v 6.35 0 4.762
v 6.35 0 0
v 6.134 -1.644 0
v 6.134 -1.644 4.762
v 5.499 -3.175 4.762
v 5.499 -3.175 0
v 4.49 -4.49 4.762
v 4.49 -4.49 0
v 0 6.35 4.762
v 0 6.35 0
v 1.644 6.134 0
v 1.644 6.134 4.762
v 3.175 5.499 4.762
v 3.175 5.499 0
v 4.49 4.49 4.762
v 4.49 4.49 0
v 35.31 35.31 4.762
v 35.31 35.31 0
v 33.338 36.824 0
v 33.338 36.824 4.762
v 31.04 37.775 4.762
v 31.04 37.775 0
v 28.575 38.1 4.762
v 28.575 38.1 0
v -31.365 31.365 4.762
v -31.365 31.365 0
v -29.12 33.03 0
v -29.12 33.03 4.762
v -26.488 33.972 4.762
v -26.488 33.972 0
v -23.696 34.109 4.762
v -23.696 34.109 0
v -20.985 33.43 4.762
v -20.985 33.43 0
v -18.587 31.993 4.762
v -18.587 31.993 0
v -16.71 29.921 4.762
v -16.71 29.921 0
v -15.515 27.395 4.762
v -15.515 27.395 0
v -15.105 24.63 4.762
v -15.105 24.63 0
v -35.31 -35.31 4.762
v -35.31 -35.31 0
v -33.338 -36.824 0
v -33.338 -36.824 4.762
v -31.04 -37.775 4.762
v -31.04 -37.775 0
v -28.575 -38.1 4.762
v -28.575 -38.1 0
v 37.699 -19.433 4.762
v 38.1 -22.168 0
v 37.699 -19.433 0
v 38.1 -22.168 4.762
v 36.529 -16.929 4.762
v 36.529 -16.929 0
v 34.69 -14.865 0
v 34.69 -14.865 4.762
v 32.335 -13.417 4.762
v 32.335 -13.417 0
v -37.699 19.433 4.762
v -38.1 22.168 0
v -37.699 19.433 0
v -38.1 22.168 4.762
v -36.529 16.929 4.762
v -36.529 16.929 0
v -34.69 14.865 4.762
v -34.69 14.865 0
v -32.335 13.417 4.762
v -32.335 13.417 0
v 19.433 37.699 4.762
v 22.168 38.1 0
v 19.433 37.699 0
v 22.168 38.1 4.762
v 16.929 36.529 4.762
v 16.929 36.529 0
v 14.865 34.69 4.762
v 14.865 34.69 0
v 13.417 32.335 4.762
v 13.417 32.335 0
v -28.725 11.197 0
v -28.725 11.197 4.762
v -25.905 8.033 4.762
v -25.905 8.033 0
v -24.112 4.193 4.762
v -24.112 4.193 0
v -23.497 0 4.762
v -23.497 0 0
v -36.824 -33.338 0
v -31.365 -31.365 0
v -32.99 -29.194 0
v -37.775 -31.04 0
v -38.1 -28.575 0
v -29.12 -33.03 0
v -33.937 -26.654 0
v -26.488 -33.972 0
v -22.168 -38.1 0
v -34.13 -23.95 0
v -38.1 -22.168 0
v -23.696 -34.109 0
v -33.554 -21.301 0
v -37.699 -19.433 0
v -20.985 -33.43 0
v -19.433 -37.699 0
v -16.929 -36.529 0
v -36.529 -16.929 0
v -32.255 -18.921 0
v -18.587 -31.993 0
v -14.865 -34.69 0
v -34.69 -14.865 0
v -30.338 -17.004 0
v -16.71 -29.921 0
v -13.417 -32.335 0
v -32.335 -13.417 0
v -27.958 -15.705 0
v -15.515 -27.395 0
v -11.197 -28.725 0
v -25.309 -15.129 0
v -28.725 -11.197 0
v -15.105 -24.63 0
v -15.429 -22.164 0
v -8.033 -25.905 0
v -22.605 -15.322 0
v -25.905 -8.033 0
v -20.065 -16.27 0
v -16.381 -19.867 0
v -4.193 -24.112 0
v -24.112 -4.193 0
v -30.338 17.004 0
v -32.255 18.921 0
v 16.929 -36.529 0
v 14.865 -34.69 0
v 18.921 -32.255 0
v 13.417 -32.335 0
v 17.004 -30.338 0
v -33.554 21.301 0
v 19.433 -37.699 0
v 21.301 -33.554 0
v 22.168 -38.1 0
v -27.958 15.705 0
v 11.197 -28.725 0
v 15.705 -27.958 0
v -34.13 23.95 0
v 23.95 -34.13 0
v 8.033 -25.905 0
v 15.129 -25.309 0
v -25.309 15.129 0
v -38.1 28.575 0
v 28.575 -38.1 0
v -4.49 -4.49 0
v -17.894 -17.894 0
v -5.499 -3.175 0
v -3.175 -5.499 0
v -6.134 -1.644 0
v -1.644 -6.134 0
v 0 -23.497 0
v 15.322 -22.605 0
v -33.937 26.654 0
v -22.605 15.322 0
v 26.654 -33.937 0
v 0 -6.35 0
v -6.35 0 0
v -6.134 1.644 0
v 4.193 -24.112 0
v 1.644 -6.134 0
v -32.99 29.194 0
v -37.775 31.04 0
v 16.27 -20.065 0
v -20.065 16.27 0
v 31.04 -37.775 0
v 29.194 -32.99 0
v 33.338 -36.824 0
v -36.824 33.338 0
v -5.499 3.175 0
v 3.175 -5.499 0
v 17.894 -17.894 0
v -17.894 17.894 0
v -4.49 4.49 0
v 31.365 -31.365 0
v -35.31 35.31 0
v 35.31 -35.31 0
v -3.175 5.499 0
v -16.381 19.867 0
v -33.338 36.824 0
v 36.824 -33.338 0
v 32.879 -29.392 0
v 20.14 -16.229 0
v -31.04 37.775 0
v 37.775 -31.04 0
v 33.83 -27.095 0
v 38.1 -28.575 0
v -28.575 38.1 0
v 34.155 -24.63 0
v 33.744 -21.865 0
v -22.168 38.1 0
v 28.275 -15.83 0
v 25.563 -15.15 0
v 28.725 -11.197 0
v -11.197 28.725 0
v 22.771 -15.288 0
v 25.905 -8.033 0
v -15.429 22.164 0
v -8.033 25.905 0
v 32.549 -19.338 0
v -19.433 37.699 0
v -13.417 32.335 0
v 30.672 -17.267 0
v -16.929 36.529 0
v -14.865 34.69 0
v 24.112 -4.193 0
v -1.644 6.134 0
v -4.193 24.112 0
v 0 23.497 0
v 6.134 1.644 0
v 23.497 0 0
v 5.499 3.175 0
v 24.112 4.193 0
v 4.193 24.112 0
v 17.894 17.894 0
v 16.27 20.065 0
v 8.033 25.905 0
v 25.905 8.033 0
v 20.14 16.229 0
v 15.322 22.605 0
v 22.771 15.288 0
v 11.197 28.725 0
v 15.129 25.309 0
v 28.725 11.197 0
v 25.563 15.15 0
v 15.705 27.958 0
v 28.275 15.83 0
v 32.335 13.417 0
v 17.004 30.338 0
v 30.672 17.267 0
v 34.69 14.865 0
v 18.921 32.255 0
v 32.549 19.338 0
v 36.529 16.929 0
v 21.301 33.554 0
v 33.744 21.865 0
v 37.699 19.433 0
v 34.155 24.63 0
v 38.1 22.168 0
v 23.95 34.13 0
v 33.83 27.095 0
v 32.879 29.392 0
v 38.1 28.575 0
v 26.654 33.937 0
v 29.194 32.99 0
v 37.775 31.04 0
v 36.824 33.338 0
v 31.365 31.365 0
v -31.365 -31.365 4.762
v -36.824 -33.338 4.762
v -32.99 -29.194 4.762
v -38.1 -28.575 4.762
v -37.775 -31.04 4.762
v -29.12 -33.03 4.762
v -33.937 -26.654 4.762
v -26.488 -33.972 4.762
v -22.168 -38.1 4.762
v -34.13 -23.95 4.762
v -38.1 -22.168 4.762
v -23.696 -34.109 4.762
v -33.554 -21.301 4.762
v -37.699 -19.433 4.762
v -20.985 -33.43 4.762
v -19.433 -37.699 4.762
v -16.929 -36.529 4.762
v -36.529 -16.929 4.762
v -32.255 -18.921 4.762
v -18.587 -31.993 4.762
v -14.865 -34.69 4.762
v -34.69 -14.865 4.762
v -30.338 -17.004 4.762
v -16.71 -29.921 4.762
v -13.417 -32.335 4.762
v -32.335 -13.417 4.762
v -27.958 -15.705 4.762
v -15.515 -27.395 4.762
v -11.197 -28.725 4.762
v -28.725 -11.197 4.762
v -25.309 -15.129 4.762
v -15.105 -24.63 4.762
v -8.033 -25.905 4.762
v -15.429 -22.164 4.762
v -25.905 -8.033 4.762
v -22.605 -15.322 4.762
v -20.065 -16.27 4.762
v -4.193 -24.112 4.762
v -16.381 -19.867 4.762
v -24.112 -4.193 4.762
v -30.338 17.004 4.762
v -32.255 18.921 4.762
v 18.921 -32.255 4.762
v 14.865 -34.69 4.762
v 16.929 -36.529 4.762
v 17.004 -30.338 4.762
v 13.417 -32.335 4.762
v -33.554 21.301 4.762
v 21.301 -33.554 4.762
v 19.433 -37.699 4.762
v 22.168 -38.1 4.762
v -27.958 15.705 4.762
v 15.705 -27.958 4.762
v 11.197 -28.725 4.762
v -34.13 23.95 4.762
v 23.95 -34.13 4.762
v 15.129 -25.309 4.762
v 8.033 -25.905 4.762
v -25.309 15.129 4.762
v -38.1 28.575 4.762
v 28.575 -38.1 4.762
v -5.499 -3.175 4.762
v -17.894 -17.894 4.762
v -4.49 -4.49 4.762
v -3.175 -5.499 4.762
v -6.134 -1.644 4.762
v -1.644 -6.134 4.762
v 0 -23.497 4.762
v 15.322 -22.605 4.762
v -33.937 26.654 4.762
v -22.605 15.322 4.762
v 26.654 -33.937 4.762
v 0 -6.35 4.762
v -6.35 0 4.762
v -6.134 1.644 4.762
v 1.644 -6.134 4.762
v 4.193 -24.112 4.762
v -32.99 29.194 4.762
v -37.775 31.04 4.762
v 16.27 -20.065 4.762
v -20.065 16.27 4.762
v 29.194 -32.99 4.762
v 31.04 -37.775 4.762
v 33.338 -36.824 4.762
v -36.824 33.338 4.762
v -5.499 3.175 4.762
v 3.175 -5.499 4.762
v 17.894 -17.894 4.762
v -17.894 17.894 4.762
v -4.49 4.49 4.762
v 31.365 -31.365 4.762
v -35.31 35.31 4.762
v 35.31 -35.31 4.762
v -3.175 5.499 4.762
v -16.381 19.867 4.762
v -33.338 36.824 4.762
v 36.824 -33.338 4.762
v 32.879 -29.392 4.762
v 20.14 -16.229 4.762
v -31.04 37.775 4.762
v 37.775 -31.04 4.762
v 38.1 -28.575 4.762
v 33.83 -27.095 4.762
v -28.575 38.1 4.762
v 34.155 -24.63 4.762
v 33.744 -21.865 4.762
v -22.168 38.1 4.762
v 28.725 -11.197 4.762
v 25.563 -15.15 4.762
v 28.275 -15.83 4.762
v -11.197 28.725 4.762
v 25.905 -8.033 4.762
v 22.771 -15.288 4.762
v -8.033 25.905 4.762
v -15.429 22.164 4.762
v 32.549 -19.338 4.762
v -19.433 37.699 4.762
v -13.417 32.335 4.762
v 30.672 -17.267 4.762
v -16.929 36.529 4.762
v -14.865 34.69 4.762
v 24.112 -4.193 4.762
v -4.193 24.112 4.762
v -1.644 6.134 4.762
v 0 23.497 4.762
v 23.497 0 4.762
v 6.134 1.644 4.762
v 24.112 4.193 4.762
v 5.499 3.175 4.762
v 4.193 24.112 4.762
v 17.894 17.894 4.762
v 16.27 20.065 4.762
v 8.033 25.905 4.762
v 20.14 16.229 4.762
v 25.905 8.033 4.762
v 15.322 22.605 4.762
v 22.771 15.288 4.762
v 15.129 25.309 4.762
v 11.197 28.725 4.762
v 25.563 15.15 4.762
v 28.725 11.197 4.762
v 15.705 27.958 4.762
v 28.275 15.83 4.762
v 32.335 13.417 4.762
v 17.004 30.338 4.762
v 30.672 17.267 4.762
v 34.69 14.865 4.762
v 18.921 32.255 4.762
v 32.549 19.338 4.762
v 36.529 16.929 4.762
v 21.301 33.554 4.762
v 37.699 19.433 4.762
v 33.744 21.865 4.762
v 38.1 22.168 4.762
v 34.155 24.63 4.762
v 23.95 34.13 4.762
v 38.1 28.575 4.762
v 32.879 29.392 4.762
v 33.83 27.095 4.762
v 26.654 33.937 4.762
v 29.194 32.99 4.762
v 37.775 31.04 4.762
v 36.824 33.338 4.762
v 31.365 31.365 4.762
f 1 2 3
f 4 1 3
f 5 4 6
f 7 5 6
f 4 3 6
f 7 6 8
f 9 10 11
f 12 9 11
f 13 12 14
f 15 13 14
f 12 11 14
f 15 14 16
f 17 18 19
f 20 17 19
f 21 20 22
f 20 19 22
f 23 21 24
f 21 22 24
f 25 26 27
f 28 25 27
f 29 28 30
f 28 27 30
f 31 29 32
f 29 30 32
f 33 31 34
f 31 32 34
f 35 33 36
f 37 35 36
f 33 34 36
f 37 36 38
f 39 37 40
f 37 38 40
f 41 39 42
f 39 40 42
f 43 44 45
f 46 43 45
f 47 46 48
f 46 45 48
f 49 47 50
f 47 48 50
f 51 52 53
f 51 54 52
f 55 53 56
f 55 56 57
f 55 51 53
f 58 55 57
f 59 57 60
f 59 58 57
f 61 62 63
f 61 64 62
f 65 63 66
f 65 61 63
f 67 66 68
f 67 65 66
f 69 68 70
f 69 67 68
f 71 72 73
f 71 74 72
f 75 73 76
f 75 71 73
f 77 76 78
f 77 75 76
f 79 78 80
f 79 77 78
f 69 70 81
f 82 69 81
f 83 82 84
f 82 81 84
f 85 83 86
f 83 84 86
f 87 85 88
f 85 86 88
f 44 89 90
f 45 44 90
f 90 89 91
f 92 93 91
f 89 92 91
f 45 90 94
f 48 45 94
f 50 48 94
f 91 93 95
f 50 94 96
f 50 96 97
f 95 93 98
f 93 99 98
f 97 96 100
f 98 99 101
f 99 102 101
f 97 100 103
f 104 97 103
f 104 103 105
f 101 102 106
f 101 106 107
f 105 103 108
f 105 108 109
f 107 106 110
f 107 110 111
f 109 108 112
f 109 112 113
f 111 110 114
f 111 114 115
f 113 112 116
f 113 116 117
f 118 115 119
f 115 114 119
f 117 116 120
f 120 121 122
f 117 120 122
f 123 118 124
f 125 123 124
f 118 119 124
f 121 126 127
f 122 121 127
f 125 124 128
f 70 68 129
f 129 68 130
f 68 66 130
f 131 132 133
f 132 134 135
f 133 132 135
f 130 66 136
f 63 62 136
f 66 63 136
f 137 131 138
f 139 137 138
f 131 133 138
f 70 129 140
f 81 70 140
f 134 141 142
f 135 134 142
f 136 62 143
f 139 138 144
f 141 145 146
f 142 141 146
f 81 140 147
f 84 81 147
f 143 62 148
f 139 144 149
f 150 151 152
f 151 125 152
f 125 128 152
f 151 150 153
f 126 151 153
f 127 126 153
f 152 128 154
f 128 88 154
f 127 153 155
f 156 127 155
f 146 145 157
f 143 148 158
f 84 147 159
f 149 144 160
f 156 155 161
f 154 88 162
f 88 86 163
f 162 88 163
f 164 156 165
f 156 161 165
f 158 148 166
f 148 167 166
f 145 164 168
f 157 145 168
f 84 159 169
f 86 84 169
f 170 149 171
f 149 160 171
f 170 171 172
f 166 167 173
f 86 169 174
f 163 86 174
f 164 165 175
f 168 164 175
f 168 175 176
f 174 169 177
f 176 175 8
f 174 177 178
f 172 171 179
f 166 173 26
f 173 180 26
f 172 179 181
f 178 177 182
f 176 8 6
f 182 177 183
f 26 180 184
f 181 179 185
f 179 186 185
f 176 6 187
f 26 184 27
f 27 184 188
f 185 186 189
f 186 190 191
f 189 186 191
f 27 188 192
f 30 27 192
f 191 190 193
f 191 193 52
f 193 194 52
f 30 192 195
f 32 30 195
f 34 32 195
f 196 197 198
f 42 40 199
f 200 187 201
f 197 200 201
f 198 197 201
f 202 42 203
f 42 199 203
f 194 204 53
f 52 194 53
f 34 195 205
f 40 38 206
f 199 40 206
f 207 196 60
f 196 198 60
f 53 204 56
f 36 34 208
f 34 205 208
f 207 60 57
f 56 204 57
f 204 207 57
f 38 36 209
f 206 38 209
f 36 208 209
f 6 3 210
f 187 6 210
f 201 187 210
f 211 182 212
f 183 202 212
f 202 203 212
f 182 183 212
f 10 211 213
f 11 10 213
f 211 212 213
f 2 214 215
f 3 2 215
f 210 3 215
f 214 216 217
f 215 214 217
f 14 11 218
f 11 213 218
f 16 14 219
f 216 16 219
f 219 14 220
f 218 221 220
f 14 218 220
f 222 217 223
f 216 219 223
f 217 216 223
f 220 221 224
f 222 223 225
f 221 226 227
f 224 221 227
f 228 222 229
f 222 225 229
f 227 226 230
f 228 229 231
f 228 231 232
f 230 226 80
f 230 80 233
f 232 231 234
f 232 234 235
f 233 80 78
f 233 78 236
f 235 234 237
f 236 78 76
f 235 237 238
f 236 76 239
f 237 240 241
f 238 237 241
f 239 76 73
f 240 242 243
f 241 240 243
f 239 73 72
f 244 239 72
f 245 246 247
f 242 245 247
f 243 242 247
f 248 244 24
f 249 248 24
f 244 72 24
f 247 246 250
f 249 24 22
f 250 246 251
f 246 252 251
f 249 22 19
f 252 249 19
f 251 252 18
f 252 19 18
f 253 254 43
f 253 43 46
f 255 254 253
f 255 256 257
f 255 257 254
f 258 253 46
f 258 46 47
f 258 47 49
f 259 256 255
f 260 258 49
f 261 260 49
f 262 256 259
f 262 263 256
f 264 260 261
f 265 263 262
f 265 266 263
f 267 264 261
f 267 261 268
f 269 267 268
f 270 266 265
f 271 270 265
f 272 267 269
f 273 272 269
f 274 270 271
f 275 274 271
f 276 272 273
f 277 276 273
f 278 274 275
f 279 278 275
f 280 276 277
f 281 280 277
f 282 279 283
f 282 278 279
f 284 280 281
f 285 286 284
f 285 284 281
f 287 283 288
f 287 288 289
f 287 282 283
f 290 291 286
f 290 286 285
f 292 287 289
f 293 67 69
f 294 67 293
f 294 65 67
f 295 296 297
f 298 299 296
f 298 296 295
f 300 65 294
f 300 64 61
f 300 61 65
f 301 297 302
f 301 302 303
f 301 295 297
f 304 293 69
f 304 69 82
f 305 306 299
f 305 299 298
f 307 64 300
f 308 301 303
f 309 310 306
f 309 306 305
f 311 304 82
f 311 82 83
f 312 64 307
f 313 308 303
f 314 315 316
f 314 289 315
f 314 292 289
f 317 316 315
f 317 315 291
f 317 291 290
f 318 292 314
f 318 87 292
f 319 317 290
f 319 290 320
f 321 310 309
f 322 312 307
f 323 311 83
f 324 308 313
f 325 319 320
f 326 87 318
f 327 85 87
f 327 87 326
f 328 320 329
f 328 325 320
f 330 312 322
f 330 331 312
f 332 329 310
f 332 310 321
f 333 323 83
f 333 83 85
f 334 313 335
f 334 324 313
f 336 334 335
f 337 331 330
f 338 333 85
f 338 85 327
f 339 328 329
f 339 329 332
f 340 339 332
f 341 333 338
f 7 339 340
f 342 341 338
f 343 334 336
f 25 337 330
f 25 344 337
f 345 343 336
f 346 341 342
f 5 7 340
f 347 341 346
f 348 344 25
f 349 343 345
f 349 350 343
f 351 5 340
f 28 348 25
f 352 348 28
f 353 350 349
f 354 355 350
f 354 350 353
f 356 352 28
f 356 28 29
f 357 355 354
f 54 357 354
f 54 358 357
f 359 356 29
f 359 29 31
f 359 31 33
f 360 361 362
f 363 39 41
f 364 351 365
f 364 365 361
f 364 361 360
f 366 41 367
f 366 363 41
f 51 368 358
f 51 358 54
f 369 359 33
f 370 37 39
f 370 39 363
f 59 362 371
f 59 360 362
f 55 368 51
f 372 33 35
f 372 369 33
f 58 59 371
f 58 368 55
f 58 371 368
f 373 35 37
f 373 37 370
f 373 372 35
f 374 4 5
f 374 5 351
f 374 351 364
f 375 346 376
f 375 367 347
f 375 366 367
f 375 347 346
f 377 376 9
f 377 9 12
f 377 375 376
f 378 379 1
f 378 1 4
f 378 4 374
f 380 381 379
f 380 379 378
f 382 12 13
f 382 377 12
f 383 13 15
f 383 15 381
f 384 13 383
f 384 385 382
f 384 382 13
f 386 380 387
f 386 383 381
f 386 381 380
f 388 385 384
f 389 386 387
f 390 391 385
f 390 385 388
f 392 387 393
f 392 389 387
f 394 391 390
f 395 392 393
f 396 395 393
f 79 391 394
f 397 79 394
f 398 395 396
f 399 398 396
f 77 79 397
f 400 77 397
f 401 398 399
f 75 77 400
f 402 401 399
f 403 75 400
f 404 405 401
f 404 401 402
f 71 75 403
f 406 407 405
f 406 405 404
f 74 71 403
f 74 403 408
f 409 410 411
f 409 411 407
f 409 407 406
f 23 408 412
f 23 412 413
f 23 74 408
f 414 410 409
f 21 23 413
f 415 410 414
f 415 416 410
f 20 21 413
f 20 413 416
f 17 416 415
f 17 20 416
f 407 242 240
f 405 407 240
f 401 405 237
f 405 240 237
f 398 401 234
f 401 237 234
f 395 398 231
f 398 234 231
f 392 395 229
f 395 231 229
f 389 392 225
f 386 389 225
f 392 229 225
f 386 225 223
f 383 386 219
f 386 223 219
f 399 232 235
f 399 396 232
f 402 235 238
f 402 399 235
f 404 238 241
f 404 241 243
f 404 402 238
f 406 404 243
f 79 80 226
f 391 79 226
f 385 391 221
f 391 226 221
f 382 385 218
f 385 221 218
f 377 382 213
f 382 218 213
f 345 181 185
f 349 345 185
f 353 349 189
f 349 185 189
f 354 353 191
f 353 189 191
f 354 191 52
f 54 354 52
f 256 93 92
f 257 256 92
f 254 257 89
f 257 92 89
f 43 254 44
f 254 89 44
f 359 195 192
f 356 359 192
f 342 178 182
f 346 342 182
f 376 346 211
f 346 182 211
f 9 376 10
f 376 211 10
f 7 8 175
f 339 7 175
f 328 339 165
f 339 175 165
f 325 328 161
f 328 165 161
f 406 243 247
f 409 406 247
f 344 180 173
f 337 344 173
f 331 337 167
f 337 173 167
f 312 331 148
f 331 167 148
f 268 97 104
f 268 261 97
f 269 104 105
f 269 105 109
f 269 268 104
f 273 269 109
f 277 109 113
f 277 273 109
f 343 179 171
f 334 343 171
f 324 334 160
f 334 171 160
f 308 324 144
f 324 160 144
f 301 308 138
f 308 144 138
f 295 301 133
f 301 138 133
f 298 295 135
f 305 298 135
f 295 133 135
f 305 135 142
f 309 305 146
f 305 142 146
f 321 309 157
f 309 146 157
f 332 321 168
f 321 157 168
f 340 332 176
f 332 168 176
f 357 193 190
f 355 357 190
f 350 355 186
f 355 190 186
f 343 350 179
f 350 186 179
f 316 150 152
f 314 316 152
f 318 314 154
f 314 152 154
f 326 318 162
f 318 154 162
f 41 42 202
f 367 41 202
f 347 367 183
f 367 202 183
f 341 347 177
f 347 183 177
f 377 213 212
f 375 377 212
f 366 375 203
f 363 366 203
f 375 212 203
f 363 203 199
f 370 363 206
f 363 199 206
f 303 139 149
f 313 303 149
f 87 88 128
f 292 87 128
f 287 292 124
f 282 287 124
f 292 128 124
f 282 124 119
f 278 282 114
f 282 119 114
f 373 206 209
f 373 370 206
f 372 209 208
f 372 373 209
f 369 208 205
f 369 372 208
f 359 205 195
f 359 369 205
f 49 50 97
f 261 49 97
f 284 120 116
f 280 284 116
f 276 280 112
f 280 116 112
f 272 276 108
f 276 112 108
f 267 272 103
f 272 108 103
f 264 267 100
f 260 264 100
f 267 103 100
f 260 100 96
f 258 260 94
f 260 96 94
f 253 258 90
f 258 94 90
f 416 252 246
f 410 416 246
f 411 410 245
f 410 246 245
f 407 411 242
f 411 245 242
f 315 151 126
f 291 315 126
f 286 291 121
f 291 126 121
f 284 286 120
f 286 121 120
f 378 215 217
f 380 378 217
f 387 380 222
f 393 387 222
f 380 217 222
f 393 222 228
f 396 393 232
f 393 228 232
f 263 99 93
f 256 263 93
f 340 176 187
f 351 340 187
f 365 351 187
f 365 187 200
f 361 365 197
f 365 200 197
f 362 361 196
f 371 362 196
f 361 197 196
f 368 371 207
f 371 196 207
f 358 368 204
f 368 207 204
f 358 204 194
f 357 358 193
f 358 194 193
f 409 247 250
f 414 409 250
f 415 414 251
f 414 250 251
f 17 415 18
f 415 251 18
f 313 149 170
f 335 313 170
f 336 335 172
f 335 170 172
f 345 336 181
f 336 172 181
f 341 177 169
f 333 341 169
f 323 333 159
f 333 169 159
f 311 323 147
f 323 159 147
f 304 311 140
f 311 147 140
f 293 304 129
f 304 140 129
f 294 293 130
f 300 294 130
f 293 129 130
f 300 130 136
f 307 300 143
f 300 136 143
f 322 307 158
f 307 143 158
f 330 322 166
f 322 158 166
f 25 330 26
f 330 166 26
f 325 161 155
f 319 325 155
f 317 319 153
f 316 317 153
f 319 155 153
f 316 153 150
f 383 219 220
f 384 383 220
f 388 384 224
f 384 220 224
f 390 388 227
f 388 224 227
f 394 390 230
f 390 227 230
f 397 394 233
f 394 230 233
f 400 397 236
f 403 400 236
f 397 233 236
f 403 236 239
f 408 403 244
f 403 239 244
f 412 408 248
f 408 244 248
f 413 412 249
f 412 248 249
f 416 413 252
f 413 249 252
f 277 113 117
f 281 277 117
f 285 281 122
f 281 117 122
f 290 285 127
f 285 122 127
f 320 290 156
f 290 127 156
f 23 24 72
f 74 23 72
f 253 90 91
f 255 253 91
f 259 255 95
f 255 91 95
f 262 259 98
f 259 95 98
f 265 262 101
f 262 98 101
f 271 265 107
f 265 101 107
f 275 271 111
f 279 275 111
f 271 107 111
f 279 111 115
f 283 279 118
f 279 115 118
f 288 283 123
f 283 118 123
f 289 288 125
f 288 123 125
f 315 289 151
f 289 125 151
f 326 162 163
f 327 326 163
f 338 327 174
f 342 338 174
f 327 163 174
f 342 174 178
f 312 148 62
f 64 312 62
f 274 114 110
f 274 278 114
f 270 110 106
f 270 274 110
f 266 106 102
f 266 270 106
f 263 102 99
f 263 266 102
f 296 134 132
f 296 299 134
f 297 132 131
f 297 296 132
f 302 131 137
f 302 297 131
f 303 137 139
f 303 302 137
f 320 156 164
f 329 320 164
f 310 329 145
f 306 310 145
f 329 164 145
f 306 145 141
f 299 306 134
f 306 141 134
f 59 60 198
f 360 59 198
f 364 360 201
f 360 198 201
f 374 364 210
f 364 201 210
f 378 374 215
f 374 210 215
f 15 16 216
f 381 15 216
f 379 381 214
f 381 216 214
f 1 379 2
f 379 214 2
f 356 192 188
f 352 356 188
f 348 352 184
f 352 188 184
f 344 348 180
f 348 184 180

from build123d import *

# Parameters (mm, degrees)
F1_DEPTH = 4.7625
F2_R     = 9.525


with BuildPart() as f1:
    # F0 (on Top) → F1 (new body)
    with BuildSketch(Plane.XY):
        with BuildLine():
            Line((-17.8944237276, -17.8944237276), (-4.4901280605, -4.4901280605))
            ThreePointArc((-4.4901280605, -4.4901280605), (-5.8666350314, -2.4300397955), (-6.35, 0))
            Line((-6.35, 0), (-23.4970493061, 0))
            ThreePointArc((-23.4970493061, 0), (-27.774154539, -10.325845461), (-38.1, -14.6029506939))
            Line((-38.1, -14.6029506939), (-38.1, -28.575))
            ThreePointArc((-38.1, -28.575), (-37.3749525472, -32.2200596933), (-35.3101920908, -35.3101920908))
            Line((-35.3101920908, -35.3101920908), (-31.3648079092, -31.3648079092))
            ThreePointArc((-31.3648079092, -31.3648079092), (-31.3648079092, -17.8944237276), (-17.8944237276, -17.8944237276))
        make_face()
        with BuildLine():
            ThreePointArc((-6.35, 0), (-5.8666350314, 2.4300397955), (-4.4901280605, 4.4901280605))
            Line((-4.4901280605, 4.4901280605), (-17.8944237276, 17.8944237276))
            ThreePointArc((-17.8944237276, 17.8944237276), (-31.3648079092, 17.8944237276), (-31.3648079092, 31.3648079092))
            Line((-31.3648079092, 31.3648079092), (-35.3101920908, 35.3101920908))
            ThreePointArc((-35.3101920908, 35.3101920908), (-37.3749525472, 32.2200596933), (-38.1, 28.575))
            Line((-38.1, 28.575), (-38.1, 14.6029506939))
            ThreePointArc((-38.1, 14.6029506939), (-27.774154539, 10.325845461), (-23.4970493061, 0))
            Line((-23.4970493061, 0), (-6.35, 0))
        make_face()
        with BuildLine():
            ThreePointArc((-4.4901280605, 4.4901280605), (-2.4300397955, 5.8666350314), (0, 6.35))
            Line((0, 6.35), (0, 23.4970493061))
            ThreePointArc((0, 23.4970493061), (-10.325845461, 27.774154539), (-14.6029506939, 38.1))
            Line((-14.6029506939, 38.1), (-28.575, 38.1))
            ThreePointArc((-28.575, 38.1), (-32.2200596933, 37.3749525472), (-35.3101920908, 35.3101920908))
            Line((-35.3101920908, 35.3101920908), (-31.3648079092, 31.3648079092))
            ThreePointArc((-31.3648079092, 31.3648079092), (-20.9845561251, 33.4295683656), (-15.1046158184, 24.6296158184))
            ThreePointArc((-15.1046158184, 24.6296158184), (-15.8296632712, 20.9845561251), (-17.8944237276, 17.8944237276))
            Line((-17.8944237276, 17.8944237276), (-4.4901280605, 4.4901280605))
        make_face()
        with BuildLine():
            ThreePointArc((0, 6.35), (2.4300397955, 5.8666350314), (4.4901280605, 4.4901280605))
            Line((4.4901280605, 4.4901280605), (17.8944237276, 17.8944237276))
            ThreePointArc((17.8944237276, 17.8944237276), (17.8944237276, 31.3648079092), (31.3648079092, 31.3648079092))
            Line((31.3648079092, 31.3648079092), (35.3101920908, 35.3101920908))
            ThreePointArc((35.3101920908, 35.3101920908), (32.2200596933, 37.3749525472), (28.575, 38.1))
            Line((28.575, 38.1), (14.6029506939, 38.1))
            ThreePointArc((14.6029506939, 38.1), (10.325845461, 27.774154539), (0, 23.4970493061))
            Line((0, 23.4970493061), (0, 6.35))
        make_face()
        with BuildLine():
            ThreePointArc((4.4901280605, 4.4901280605), (5.8666350314, 2.4300397955), (6.35, 0))
            Line((6.35, 0), (23.4970493061, 0))
            ThreePointArc((23.4970493061, 0), (27.774154539, 10.325845461), (38.1, 14.6029506939))
            Line((38.1, 14.6029506939), (38.1, 28.575))
            ThreePointArc((38.1, 28.575), (37.3749525472, 32.2200596933), (35.3101920908, 35.3101920908))
            Line((35.3101920908, 35.3101920908), (31.3648079092, 31.3648079092))
            ThreePointArc((31.3648079092, 31.3648079092), (33.4295683656, 28.2746755117), (34.1546158184, 24.6296158184))
            ThreePointArc((34.1546158184, 24.6296158184), (28.2746755117, 15.8296632712), (17.8944237276, 17.8944237276))
            Line((17.8944237276, 17.8944237276), (4.4901280605, 4.4901280605))
        make_face()
        with BuildLine():
            Line((23.4970493061, 0), (6.35, 0))
            ThreePointArc((6.35, 0), (5.8666350314, -2.4300397955), (4.4901280605, -4.4901280605))
            Line((4.4901280605, -4.4901280605), (17.8944237276, -17.8944237276))
            ThreePointArc((17.8944237276, -17.8944237276), (28.2746755117, -15.8296632712), (34.1546158184, -24.6296158184))
            ThreePointArc((34.1546158184, -24.6296158184), (33.4295683656, -28.2746755117), (31.3648079092, -31.3648079092))
            Line((31.3648079092, -31.3648079092), (35.3101920908, -35.3101920908))
            ThreePointArc((35.3101920908, -35.3101920908), (37.3749525472, -32.2200596933), (38.1, -28.575))
            Line((38.1, -28.575), (38.1, -14.6029506939))
            ThreePointArc((38.1, -14.6029506939), (27.774154539, -10.325845461), (23.4970493061, 0))
        make_face()
        with BuildLine():
            Line((17.8944237276, -17.8944237276), (4.4901280605, -4.4901280605))
            ThreePointArc((4.4901280605, -4.4901280605), (2.4300397955, -5.8666350314), (0, -6.35))
            Line((0, -6.35), (0, -23.4970493061))
            ThreePointArc((0, -23.4970493061), (10.325845461, -27.774154539), (14.6029506939, -38.1))
            Line((14.6029506939, -38.1), (28.575, -38.1))
            ThreePointArc((28.575, -38.1), (32.2200596933, -37.3749525472), (35.3101920908, -35.3101920908))
            Line((35.3101920908, -35.3101920908), (31.3648079092, -31.3648079092))
            ThreePointArc((31.3648079092, -31.3648079092), (17.8944237276, -31.3648079092), (17.8944237276, -17.8944237276))
        make_face()
        with BuildLine():
            Line((0, -23.4970493061), (0, -6.35))
            ThreePointArc((0, -6.35), (-2.4300397955, -5.8666350314), (-4.4901280605, -4.4901280605))
            Line((-4.4901280605, -4.4901280605), (-17.8944237276, -17.8944237276))
            ThreePointArc((-17.8944237276, -17.8944237276), (-15.8296632712, -20.9845561251), (-15.1046158184, -24.6296158184))
            ThreePointArc((-15.1046158184, -24.6296158184), (-20.9845561251, -33.4295683656), (-31.3648079092, -31.3648079092))
            Line((-31.3648079092, -31.3648079092), (-35.3101920908, -35.3101920908))
            ThreePointArc((-35.3101920908, -35.3101920908), (-32.2200596933, -37.3749525472), (-28.575, -38.1))
            Line((-28.575, -38.1), (-14.6029506939, -38.1))
            ThreePointArc((-14.6029506939, -38.1), (-10.325845461, -27.774154539), (0, -23.4970493061))
        make_face()
    extrude(amount=F1_DEPTH)

    # F2
    f2_edges = [f1.edges().sort_by_distance(p)[0] for p in [
        (-38.1, 14.602951, 2.38125),
        (-38.1, -14.602951, 2.38125),
        (-14.602951, -38.1, 2.38125),
        (14.602951, -38.1, 2.38125),
        (38.1, -14.602951, 2.38125),
        (38.1, 14.602951, 2.38125),
        (-14.602951, 38.1, 2.38125),
        (14.602951, 38.1, 2.38125),
    ]]
    fillet(f2_edges, radius=F2_R)


solid = f1.part
